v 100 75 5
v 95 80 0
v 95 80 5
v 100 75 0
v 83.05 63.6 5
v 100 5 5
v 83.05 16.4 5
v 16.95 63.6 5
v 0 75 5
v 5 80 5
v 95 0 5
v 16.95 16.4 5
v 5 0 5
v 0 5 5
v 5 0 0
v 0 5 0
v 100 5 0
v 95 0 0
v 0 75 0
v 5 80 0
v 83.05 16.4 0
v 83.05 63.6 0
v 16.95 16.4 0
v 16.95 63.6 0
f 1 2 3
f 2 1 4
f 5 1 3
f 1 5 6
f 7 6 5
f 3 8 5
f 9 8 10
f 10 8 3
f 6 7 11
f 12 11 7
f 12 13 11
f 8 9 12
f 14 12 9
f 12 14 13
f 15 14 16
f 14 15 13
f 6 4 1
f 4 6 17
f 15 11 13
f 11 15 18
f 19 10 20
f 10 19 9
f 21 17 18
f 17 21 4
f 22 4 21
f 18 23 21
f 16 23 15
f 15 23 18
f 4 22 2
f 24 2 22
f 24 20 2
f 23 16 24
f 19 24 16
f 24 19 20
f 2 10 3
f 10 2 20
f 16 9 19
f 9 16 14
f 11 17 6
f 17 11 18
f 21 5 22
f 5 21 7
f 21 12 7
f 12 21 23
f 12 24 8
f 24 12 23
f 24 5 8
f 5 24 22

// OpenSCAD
$fn = 32;

// ----------------------------------------------------------------------
// Windowed plate: 1 voids, 100 x 80 x 5 mm
// ----------------------------------------------------------------------

// --- parameters (mm) ---
plate_l = 100;            // plate length, X
plate_w = 80;             // plate width, Y
plate_t = 5;              // plate thickness, Z
edge_margin = 12;         // wall from the plate edge to any window
win1_l = 66.1;            // window length
win1_w = 47.2;            // window width
depth_1 = 5;              // depth of void 1 (full thickness = through)
corner_c = 5;             // corner chamfer of the plate

profile = [[5, 0], [95, 0], [100, 5], [100, 75], [95, 80], [5, 80], [0, 75], [0, 5]];  // primary outline, 8 points, counter clockwise
void_1 = [[16.95, 16.4], [83.05, 16.4], [83.05, 63.6], [16.95, 63.6]];  // large central window, 4 points

// --- the one profile operation ---
difference() {
  linear_extrude(height = plate_t) polygon(points = profile);
  translate([0, 0, -1])
    linear_extrude(height = plate_t + 2) polygon(points = void_1);
}
